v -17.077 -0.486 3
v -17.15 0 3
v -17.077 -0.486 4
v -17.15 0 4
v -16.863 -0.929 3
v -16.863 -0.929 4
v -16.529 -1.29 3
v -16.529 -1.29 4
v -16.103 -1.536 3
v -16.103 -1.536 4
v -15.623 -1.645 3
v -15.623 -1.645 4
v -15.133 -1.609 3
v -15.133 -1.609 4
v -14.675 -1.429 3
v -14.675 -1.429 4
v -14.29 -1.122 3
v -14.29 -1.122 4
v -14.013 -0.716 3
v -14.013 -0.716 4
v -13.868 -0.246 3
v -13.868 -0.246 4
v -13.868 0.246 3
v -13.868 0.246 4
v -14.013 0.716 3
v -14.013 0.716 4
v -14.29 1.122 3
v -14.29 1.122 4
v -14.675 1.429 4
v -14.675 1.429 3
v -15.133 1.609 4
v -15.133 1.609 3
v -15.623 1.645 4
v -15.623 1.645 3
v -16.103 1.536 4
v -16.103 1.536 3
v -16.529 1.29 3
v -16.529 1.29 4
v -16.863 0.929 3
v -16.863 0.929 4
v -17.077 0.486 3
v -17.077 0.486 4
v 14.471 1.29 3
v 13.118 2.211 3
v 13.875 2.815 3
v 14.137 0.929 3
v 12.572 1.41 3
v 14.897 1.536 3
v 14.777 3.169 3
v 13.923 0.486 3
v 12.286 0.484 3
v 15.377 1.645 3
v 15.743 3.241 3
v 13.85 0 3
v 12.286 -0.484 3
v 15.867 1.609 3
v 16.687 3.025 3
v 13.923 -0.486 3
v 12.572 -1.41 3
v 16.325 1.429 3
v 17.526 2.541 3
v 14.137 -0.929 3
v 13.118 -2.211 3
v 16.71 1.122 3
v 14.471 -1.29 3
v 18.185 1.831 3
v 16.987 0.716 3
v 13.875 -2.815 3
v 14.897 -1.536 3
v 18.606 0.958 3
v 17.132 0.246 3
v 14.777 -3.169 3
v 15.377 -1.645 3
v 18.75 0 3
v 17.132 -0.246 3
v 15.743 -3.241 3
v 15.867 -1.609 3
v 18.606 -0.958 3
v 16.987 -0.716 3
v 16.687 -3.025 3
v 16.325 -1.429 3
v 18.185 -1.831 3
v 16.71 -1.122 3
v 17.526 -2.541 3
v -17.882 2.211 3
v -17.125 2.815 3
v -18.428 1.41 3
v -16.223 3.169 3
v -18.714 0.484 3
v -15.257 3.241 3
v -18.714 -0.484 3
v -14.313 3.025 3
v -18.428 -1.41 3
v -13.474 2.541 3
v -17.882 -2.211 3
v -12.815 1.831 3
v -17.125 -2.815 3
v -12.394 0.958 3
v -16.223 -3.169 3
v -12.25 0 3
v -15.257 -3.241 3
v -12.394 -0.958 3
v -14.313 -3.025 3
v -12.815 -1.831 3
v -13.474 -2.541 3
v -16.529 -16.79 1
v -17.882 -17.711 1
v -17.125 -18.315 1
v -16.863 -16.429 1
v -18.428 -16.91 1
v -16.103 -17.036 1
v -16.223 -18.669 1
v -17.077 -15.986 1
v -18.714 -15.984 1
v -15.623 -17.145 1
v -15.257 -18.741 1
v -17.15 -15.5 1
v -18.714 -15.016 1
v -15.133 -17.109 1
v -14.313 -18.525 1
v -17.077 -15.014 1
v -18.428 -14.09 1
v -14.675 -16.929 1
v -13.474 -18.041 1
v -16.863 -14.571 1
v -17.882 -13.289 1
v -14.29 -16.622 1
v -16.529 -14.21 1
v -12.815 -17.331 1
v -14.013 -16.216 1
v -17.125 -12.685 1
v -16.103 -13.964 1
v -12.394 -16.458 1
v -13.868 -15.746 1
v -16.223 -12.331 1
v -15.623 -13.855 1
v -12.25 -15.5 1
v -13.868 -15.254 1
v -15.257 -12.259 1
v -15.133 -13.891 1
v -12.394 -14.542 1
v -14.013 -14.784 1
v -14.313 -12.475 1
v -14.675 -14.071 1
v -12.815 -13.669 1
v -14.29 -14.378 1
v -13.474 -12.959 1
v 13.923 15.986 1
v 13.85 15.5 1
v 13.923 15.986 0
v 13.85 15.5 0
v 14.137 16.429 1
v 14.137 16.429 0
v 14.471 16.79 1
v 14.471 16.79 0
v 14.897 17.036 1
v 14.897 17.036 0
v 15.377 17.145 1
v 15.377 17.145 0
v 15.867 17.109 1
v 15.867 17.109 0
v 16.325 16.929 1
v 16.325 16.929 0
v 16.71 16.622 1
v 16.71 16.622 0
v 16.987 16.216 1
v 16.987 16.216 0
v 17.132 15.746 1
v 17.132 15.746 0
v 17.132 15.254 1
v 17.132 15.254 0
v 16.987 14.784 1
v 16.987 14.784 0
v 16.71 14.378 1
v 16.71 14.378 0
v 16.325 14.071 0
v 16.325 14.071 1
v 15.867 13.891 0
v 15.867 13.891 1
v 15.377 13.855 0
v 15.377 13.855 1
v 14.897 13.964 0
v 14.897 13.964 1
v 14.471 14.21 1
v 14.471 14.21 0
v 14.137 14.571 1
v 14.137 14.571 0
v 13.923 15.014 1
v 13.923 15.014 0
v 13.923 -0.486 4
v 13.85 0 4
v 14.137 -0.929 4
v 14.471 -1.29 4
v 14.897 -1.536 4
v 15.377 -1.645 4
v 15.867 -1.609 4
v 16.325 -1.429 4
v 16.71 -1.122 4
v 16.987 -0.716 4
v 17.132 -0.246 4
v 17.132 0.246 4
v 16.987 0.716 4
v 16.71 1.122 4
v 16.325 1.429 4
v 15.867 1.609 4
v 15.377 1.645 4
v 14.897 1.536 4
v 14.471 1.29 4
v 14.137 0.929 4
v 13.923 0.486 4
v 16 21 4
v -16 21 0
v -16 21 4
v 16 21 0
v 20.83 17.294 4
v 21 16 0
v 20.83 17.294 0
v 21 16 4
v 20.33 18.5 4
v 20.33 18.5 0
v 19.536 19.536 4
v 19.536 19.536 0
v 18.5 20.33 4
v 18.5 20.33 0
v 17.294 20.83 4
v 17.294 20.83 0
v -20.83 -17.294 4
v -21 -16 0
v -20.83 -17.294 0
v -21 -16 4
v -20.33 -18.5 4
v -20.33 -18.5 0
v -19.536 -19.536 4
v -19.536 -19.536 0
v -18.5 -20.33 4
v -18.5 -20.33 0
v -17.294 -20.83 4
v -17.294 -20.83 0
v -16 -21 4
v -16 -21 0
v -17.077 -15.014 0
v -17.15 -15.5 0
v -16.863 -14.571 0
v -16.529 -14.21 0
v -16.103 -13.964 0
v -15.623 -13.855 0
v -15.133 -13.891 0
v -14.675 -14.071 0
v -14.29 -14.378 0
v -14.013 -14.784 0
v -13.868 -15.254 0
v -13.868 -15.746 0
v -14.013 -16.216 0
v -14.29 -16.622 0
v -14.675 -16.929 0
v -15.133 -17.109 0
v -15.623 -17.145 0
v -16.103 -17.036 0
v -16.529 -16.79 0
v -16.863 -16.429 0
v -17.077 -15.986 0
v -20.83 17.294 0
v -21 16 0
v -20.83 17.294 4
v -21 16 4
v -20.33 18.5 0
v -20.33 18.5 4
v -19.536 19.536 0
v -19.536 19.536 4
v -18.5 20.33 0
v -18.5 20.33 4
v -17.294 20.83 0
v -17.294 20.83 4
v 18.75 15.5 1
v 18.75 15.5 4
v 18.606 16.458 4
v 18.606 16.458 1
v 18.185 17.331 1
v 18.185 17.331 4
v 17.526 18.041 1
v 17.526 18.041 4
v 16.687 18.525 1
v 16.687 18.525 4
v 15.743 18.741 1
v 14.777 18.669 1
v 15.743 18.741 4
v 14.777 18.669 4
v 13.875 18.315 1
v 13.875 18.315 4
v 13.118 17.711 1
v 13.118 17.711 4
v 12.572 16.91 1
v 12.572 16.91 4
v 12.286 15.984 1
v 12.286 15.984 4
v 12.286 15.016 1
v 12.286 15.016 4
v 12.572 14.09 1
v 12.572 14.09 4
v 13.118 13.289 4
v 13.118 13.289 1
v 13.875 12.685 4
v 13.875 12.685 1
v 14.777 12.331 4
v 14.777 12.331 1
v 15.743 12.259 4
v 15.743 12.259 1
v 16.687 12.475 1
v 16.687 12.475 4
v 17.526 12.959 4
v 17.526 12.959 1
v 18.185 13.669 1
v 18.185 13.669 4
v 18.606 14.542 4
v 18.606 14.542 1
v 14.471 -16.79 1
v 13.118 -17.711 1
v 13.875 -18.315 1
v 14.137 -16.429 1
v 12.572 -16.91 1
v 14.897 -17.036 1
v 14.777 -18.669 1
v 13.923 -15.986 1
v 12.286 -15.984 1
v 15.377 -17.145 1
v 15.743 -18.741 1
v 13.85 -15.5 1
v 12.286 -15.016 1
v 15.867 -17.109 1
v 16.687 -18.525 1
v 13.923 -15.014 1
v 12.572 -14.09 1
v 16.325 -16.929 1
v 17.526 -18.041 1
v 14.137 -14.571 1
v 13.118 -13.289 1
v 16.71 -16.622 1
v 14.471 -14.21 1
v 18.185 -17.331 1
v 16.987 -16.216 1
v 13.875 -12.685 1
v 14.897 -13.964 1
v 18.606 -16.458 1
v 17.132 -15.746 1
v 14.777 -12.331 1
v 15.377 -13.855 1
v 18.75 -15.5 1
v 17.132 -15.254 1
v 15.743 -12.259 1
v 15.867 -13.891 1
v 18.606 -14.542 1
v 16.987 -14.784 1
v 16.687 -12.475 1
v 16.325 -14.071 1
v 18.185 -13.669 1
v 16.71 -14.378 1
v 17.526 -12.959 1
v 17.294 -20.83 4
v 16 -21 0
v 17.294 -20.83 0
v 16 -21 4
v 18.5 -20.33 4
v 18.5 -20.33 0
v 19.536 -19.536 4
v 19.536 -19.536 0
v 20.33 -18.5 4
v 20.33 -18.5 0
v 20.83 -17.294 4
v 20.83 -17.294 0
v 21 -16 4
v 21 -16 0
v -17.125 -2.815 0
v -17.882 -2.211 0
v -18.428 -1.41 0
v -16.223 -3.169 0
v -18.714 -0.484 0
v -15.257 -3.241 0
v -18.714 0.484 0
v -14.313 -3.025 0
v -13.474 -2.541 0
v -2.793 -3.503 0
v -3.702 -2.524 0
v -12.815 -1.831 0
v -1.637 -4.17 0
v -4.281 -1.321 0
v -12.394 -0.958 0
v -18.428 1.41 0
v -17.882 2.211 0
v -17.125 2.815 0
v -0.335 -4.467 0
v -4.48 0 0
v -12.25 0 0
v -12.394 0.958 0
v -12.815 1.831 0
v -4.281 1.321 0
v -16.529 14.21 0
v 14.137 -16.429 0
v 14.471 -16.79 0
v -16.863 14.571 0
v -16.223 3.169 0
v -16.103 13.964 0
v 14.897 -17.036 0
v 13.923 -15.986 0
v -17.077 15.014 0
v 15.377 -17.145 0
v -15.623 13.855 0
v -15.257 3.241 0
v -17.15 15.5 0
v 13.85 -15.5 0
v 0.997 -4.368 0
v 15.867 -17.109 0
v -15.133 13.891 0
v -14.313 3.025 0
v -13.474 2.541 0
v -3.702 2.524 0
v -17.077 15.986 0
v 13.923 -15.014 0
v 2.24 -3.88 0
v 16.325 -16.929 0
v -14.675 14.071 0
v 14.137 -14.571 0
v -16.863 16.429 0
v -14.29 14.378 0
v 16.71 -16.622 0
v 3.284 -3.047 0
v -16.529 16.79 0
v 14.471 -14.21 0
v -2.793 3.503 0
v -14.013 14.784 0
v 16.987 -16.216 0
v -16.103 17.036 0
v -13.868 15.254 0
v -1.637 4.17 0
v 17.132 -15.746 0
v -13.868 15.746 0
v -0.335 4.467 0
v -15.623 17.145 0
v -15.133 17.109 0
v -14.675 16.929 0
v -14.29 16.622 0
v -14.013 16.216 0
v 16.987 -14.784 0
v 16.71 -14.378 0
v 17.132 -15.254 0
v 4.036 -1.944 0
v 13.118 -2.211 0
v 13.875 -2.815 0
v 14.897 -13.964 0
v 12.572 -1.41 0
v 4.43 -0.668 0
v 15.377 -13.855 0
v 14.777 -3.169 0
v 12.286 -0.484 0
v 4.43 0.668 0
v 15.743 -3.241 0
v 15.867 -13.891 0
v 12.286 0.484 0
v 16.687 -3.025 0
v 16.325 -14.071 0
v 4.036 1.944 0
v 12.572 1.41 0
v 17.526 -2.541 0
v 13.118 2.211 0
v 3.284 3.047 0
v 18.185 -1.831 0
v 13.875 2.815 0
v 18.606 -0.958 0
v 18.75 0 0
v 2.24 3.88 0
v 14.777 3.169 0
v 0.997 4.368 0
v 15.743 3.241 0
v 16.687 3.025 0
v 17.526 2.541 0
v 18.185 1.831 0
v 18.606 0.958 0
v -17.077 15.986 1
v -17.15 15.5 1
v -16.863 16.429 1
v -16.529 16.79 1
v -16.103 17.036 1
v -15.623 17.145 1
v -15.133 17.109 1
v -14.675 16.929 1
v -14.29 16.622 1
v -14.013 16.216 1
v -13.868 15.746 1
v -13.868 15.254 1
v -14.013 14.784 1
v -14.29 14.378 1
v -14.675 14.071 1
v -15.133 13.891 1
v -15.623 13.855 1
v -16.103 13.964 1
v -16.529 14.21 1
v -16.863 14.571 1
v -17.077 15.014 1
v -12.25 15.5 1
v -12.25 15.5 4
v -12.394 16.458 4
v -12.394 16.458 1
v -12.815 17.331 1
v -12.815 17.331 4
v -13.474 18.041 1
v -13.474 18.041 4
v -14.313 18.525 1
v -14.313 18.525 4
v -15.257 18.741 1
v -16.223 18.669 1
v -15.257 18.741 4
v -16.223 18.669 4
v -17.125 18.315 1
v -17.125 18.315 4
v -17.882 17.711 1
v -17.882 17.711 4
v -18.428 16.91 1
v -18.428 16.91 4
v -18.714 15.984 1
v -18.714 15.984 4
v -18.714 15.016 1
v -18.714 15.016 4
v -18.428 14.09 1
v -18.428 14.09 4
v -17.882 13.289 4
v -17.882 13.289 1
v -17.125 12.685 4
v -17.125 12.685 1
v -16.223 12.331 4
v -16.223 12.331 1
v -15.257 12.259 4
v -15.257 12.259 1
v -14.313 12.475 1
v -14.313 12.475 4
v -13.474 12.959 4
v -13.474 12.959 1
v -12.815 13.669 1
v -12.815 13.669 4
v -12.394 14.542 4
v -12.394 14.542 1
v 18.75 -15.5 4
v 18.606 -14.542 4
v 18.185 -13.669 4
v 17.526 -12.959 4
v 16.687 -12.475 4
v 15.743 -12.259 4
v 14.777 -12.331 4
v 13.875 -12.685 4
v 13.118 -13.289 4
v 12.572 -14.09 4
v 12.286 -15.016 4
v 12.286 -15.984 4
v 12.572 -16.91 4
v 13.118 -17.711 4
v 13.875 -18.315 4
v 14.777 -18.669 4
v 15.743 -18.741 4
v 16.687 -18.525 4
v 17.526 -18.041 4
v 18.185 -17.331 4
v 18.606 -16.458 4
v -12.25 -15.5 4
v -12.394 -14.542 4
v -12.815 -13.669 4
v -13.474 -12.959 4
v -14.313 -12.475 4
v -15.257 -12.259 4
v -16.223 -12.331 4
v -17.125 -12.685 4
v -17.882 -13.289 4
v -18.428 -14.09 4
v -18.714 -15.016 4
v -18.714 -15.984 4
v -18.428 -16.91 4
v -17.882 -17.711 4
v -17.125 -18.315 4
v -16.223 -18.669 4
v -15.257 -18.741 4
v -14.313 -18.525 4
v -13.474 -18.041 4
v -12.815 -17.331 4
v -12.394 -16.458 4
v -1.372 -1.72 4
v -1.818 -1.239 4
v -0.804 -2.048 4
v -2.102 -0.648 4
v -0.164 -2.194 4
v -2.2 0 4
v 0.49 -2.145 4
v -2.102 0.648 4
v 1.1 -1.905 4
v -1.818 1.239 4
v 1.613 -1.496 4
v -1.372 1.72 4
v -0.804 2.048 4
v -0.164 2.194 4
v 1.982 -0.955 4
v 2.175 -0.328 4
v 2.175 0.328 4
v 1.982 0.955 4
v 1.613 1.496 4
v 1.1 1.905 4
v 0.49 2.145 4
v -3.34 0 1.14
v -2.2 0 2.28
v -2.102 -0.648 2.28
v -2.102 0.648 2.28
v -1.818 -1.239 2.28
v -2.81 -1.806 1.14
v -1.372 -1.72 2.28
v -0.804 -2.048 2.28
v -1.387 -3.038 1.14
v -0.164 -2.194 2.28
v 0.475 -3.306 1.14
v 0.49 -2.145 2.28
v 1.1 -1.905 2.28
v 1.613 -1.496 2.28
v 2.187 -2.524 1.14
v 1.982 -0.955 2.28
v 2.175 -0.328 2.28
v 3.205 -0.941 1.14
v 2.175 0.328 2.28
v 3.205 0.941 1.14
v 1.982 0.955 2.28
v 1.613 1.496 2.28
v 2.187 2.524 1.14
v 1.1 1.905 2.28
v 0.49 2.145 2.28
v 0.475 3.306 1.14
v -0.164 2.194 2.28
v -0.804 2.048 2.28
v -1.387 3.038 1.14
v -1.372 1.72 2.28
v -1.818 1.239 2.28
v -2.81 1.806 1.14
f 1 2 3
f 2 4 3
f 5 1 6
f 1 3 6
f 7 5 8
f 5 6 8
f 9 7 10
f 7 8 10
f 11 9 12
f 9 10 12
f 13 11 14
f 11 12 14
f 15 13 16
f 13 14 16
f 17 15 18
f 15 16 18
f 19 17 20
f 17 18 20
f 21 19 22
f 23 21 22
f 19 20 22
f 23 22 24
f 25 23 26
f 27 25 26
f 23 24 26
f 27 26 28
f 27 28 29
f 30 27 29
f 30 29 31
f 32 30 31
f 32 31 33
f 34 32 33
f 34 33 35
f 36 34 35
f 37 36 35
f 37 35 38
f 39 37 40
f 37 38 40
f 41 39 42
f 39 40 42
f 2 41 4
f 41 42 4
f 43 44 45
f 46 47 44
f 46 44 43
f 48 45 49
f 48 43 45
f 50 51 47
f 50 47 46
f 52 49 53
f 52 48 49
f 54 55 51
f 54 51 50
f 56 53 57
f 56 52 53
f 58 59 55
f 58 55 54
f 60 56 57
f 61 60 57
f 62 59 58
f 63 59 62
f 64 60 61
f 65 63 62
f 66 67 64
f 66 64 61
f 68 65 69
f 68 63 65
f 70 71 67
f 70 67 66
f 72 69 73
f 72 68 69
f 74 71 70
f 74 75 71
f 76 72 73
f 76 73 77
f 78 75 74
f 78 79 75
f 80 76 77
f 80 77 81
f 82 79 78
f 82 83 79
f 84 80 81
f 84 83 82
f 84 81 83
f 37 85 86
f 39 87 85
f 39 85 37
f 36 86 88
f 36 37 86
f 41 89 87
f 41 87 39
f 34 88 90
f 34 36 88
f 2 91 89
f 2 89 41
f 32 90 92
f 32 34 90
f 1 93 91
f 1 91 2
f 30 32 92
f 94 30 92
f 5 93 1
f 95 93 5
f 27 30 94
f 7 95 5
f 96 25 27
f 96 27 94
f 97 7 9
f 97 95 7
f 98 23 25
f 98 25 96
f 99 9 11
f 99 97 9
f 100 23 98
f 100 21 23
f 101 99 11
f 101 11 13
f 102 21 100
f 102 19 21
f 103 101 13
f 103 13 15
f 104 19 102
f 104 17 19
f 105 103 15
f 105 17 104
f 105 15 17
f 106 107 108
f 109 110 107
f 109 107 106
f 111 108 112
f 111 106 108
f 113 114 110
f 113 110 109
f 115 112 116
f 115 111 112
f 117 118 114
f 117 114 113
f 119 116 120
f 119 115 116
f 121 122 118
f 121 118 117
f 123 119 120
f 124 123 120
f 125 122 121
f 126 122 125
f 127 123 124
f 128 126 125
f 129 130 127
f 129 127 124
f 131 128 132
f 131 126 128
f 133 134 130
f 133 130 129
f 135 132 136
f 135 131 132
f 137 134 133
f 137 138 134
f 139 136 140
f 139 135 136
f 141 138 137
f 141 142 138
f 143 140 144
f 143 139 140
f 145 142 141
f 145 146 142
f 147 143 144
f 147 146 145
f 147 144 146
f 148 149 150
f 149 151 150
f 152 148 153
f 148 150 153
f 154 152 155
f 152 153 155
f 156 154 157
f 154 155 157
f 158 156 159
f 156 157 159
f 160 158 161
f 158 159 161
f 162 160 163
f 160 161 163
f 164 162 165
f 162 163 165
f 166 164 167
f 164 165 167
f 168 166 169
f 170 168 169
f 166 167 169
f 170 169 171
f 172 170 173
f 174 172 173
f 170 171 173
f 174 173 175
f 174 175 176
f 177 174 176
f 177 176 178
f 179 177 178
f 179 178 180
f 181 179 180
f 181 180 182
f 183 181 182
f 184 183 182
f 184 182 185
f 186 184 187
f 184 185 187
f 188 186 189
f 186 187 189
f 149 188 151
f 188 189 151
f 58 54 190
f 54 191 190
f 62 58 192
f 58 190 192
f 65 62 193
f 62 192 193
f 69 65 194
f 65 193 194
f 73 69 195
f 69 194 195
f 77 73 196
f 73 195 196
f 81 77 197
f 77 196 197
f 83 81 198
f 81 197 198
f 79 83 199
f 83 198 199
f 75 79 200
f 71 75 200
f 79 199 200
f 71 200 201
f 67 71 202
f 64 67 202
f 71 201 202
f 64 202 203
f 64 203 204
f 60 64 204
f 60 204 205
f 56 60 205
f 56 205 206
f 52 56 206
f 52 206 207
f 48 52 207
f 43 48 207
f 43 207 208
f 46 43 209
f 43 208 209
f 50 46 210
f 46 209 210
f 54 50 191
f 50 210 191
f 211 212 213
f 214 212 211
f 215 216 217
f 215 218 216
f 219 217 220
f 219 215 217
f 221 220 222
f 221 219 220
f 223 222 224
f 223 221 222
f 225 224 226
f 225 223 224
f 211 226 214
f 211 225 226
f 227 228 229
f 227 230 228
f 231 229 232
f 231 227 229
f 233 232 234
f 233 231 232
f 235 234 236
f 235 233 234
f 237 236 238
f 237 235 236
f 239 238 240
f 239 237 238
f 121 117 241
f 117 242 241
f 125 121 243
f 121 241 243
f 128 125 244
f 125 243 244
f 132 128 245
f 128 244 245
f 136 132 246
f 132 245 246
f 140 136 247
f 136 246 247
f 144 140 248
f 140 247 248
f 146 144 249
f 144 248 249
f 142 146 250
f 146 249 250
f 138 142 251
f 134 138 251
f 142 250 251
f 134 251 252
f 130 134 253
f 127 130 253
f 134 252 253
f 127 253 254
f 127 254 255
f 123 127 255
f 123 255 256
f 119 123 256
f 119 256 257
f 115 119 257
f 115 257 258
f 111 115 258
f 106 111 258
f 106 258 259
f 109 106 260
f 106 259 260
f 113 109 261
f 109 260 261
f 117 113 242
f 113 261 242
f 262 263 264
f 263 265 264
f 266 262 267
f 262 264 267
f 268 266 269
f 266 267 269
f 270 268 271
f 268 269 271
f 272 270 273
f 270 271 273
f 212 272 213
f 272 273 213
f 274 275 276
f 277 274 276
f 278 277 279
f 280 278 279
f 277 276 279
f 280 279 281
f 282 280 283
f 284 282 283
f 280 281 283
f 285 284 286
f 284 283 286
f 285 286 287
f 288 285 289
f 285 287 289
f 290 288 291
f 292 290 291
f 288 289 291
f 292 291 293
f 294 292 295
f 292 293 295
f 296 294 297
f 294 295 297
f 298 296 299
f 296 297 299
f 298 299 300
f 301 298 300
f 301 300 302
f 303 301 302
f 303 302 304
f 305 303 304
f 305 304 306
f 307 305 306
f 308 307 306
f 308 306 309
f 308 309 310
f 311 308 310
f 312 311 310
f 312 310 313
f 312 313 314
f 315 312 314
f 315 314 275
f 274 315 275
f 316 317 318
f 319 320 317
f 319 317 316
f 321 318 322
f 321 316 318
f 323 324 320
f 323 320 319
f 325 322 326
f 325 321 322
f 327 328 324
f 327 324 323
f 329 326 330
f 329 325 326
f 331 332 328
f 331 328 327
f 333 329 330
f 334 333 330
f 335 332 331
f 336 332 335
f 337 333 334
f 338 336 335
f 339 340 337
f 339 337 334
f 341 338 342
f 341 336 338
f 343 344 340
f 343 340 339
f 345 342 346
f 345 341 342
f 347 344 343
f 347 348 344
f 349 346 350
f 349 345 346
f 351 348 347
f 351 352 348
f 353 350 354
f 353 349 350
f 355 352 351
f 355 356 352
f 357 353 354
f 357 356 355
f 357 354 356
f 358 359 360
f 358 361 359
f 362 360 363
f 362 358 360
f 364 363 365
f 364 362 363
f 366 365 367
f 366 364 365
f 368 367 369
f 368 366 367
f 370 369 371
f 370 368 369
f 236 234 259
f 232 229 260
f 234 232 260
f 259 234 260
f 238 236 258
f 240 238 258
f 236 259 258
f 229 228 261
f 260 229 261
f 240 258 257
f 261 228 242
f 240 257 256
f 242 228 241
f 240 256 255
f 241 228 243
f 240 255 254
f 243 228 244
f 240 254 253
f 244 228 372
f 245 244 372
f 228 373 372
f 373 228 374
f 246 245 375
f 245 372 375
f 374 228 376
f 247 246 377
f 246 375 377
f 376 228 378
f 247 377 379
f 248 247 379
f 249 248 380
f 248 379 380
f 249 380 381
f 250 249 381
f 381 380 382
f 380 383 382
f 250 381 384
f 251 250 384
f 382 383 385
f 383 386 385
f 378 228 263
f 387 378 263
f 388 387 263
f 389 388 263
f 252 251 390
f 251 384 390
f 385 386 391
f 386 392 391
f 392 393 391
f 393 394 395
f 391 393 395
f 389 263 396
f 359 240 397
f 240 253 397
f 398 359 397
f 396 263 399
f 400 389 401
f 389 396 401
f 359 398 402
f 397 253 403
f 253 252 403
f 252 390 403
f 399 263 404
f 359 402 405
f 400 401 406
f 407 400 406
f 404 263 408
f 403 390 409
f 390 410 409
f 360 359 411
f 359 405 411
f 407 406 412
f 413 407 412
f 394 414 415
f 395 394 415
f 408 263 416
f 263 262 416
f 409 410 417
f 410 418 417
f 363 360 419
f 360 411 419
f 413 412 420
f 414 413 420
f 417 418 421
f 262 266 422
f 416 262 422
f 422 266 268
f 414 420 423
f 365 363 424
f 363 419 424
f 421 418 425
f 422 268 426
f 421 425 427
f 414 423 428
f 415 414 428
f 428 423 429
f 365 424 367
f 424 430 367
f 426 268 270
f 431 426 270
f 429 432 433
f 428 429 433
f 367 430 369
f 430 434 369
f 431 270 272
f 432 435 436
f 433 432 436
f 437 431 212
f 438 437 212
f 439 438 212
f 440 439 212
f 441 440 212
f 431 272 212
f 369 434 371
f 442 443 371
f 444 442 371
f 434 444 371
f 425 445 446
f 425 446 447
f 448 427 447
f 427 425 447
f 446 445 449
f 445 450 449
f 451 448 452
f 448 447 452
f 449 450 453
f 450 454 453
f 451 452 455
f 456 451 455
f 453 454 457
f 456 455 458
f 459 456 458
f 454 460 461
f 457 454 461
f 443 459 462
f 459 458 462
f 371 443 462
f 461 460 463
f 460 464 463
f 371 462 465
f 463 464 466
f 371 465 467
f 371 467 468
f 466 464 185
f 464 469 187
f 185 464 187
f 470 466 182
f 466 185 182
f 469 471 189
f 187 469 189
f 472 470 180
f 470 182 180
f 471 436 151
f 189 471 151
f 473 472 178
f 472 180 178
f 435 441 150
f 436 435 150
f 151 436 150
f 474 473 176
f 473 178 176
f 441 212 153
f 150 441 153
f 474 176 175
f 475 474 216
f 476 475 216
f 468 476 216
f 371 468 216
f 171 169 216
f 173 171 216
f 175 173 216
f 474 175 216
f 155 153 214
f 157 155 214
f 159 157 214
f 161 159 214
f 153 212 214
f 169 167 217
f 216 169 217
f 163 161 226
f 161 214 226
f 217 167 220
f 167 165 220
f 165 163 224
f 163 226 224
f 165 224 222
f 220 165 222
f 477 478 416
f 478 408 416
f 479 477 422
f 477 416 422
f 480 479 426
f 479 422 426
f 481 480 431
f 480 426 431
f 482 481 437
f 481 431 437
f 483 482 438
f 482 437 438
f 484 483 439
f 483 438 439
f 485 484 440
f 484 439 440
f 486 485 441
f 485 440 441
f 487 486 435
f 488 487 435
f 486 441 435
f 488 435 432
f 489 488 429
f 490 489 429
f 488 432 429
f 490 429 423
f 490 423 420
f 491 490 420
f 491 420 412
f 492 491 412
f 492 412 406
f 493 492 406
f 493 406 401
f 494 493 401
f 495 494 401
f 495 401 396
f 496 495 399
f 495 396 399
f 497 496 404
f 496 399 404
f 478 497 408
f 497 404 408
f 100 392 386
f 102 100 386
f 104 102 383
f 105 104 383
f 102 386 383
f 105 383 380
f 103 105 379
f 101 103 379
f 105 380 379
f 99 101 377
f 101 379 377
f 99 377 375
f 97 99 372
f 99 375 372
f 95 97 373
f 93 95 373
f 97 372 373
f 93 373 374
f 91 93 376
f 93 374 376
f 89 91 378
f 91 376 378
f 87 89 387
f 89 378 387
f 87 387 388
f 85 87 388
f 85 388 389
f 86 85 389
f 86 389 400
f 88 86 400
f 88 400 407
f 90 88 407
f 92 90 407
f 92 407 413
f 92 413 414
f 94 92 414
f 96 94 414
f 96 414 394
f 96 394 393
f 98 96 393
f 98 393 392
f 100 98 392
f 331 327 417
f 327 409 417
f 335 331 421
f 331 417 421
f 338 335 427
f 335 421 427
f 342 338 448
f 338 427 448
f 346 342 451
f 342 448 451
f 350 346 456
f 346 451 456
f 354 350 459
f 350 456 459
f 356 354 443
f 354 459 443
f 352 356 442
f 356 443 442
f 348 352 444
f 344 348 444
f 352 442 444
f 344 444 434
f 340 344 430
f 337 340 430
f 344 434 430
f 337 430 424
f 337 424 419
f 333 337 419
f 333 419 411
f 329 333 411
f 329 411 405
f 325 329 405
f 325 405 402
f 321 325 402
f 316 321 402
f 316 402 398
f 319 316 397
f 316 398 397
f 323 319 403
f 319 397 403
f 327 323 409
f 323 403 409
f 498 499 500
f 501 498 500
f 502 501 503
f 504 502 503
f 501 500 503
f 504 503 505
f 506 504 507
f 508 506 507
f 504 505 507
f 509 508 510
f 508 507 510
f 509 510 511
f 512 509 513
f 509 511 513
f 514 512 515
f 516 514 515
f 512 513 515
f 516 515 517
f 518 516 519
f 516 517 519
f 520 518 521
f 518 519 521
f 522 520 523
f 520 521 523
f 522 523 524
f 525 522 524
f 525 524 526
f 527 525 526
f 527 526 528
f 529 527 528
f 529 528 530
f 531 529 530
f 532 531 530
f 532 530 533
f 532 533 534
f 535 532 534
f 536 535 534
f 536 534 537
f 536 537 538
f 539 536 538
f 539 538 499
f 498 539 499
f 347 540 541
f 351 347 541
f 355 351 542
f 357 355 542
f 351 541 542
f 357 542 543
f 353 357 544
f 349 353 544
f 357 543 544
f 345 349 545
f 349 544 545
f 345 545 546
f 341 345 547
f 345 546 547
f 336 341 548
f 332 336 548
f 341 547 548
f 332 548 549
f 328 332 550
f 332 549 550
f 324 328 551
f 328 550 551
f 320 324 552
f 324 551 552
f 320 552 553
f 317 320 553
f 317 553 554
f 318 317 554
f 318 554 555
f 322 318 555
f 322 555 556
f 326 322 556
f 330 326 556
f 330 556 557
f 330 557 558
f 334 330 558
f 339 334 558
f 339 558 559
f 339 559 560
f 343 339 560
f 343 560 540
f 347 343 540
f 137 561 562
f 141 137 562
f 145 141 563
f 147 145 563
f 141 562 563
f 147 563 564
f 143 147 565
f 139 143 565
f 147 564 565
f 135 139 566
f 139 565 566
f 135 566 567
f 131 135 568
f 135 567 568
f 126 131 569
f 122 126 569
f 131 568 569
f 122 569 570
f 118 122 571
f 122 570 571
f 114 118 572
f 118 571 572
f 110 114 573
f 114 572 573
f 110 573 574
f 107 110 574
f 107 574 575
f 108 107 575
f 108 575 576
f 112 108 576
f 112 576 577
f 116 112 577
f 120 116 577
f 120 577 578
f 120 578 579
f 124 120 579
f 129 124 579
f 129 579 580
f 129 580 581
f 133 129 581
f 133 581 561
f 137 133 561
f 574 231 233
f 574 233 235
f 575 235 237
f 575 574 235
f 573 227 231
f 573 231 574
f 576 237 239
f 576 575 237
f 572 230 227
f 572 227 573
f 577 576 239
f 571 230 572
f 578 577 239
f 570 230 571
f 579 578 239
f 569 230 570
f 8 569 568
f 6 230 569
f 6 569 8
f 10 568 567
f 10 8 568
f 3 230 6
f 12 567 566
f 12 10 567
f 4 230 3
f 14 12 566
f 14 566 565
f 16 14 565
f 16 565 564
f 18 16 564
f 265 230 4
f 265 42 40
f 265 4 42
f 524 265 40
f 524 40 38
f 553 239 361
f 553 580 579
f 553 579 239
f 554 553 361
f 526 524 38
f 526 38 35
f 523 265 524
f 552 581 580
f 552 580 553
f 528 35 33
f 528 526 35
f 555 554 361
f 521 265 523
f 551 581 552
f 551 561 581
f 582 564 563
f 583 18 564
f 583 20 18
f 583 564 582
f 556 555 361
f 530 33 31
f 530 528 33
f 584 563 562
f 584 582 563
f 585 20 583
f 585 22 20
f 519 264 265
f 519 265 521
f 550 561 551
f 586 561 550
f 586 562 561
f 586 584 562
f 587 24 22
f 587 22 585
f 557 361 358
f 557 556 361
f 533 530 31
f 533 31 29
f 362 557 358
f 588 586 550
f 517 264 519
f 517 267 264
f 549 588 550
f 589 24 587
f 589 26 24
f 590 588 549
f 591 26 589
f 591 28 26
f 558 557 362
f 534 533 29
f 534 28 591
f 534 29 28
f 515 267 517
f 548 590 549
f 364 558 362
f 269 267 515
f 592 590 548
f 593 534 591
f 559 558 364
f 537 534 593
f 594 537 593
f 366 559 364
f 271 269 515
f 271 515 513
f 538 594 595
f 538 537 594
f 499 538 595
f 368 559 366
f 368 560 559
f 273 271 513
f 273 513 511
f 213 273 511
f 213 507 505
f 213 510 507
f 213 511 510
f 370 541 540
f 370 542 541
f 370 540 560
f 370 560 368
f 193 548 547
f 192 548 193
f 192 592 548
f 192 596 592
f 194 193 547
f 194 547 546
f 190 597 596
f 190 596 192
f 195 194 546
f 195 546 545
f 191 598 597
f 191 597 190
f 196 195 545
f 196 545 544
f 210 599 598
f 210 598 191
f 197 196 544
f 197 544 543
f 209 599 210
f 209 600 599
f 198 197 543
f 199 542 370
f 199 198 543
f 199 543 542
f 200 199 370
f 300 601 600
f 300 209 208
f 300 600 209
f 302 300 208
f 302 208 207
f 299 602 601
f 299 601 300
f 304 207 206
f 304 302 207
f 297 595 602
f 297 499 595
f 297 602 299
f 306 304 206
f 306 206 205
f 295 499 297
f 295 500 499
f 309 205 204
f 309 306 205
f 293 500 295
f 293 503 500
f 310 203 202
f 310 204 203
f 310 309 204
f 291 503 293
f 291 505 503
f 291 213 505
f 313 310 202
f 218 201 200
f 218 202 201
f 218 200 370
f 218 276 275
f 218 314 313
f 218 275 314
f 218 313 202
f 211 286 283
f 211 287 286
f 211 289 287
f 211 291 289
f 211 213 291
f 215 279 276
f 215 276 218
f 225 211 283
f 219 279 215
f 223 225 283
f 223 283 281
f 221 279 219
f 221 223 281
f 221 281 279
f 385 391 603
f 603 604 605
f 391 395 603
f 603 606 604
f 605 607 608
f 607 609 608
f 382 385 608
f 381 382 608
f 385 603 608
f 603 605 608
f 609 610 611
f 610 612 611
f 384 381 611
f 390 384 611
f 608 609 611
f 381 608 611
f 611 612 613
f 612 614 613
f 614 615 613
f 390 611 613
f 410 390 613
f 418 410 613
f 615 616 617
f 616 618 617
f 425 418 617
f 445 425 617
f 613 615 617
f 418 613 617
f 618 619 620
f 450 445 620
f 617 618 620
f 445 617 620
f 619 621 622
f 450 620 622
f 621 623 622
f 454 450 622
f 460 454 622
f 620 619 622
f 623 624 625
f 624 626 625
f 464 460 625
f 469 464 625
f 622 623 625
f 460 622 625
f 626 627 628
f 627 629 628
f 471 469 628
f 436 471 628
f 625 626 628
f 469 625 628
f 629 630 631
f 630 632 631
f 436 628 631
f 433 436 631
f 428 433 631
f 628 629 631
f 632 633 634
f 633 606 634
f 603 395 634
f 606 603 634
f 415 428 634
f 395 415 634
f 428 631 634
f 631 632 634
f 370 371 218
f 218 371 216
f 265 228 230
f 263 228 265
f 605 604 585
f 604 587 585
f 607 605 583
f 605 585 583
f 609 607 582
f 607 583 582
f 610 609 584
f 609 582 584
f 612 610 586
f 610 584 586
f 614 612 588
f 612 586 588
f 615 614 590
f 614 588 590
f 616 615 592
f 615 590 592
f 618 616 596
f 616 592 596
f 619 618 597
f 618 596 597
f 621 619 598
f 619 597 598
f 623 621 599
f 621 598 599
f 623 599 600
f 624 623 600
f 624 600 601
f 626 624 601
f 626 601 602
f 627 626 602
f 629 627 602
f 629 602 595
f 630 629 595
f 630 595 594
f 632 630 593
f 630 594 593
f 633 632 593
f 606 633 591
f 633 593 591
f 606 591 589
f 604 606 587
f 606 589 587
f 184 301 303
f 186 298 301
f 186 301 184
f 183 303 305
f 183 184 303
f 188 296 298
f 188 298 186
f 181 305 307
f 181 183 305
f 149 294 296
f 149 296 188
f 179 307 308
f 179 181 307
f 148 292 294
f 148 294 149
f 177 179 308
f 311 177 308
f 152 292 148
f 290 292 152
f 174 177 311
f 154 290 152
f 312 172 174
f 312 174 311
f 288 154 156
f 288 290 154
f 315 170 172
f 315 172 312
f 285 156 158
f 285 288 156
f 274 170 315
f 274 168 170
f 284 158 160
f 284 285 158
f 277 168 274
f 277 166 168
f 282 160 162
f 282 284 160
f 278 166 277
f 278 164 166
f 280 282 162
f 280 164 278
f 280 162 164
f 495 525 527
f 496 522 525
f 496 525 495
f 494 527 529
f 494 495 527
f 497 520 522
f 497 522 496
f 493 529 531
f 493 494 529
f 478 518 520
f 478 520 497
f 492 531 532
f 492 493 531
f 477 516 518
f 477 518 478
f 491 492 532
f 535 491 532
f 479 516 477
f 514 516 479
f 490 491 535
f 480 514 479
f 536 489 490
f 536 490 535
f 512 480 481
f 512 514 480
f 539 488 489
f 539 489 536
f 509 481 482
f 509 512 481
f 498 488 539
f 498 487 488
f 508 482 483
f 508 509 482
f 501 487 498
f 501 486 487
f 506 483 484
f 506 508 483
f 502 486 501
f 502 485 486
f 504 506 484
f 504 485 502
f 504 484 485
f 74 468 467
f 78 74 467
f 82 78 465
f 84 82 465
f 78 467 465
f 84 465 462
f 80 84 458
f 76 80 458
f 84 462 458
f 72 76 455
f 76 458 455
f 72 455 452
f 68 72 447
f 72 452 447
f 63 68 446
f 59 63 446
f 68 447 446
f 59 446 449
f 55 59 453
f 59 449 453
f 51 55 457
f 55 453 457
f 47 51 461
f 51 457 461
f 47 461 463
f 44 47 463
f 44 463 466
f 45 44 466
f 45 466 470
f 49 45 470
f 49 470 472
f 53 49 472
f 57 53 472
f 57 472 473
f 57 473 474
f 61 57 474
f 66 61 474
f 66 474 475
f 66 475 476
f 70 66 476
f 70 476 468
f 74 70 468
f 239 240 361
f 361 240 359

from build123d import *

# Parameters (mm, degrees)
F0_W           = 42
F0_H           = 42
F1_DEPTH       = 4
F3_R           = 5
F4_D           = 3.3
F4_CBORE_D     = 6.5
F4_CBORE_DEPTH = 3
F6_D           = 4.4
F6_CSINK_D     = 8.96
F6_CSINK_ANGLE = 90
F8_D           = 3.3
F8_CBORE_D     = 6.5
F8_CBORE_DEPTH = 3


with BuildPart() as f1:
    # F0 (on Top) → F1 (new body)
    with BuildSketch(Plane.XY):
        Rectangle(F0_W, F0_H)
    extrude(amount=F1_DEPTH)

    # F3
    f3_edges = [f1.edges().sort_by_distance(p)[0] for p in [
        (-21, 21, 2),
        (-21, -21, 2),
        (21, -21, 2),
        (21, 21, 2),
    ]]
    fillet(f3_edges, radius=F3_R)

    # F4 (through all)
    with Locations(Plane.XY.offset(4)):
        with Locations((-15.5, 15.5), (15.5, 15.5), (15.5, -15.5), (-15.5, -15.5)):
            CounterBoreHole(F4_D / 2, F4_CBORE_D / 2, F4_CBORE_DEPTH)

    # F6 (through all)
    with Locations(Plane(origin=(0, 0, 0), x_dir=(1, 0, 0), z_dir=(0, 0, -1))):
        with Locations((0, 0)):
            CounterSinkHole(F6_D / 2, F6_CSINK_D / 2, counter_sink_angle=F6_CSINK_ANGLE)

    # F8 (through all)
    with Locations(Plane(origin=(0, 0, 0), x_dir=(1, 0, 0), z_dir=(0, 0, -1))):
        with Locations((-15.5, 0), (15.5, 0)):
            CounterBoreHole(F8_D / 2, F8_CBORE_D / 2, F8_CBORE_DEPTH)


solid = f1.part
